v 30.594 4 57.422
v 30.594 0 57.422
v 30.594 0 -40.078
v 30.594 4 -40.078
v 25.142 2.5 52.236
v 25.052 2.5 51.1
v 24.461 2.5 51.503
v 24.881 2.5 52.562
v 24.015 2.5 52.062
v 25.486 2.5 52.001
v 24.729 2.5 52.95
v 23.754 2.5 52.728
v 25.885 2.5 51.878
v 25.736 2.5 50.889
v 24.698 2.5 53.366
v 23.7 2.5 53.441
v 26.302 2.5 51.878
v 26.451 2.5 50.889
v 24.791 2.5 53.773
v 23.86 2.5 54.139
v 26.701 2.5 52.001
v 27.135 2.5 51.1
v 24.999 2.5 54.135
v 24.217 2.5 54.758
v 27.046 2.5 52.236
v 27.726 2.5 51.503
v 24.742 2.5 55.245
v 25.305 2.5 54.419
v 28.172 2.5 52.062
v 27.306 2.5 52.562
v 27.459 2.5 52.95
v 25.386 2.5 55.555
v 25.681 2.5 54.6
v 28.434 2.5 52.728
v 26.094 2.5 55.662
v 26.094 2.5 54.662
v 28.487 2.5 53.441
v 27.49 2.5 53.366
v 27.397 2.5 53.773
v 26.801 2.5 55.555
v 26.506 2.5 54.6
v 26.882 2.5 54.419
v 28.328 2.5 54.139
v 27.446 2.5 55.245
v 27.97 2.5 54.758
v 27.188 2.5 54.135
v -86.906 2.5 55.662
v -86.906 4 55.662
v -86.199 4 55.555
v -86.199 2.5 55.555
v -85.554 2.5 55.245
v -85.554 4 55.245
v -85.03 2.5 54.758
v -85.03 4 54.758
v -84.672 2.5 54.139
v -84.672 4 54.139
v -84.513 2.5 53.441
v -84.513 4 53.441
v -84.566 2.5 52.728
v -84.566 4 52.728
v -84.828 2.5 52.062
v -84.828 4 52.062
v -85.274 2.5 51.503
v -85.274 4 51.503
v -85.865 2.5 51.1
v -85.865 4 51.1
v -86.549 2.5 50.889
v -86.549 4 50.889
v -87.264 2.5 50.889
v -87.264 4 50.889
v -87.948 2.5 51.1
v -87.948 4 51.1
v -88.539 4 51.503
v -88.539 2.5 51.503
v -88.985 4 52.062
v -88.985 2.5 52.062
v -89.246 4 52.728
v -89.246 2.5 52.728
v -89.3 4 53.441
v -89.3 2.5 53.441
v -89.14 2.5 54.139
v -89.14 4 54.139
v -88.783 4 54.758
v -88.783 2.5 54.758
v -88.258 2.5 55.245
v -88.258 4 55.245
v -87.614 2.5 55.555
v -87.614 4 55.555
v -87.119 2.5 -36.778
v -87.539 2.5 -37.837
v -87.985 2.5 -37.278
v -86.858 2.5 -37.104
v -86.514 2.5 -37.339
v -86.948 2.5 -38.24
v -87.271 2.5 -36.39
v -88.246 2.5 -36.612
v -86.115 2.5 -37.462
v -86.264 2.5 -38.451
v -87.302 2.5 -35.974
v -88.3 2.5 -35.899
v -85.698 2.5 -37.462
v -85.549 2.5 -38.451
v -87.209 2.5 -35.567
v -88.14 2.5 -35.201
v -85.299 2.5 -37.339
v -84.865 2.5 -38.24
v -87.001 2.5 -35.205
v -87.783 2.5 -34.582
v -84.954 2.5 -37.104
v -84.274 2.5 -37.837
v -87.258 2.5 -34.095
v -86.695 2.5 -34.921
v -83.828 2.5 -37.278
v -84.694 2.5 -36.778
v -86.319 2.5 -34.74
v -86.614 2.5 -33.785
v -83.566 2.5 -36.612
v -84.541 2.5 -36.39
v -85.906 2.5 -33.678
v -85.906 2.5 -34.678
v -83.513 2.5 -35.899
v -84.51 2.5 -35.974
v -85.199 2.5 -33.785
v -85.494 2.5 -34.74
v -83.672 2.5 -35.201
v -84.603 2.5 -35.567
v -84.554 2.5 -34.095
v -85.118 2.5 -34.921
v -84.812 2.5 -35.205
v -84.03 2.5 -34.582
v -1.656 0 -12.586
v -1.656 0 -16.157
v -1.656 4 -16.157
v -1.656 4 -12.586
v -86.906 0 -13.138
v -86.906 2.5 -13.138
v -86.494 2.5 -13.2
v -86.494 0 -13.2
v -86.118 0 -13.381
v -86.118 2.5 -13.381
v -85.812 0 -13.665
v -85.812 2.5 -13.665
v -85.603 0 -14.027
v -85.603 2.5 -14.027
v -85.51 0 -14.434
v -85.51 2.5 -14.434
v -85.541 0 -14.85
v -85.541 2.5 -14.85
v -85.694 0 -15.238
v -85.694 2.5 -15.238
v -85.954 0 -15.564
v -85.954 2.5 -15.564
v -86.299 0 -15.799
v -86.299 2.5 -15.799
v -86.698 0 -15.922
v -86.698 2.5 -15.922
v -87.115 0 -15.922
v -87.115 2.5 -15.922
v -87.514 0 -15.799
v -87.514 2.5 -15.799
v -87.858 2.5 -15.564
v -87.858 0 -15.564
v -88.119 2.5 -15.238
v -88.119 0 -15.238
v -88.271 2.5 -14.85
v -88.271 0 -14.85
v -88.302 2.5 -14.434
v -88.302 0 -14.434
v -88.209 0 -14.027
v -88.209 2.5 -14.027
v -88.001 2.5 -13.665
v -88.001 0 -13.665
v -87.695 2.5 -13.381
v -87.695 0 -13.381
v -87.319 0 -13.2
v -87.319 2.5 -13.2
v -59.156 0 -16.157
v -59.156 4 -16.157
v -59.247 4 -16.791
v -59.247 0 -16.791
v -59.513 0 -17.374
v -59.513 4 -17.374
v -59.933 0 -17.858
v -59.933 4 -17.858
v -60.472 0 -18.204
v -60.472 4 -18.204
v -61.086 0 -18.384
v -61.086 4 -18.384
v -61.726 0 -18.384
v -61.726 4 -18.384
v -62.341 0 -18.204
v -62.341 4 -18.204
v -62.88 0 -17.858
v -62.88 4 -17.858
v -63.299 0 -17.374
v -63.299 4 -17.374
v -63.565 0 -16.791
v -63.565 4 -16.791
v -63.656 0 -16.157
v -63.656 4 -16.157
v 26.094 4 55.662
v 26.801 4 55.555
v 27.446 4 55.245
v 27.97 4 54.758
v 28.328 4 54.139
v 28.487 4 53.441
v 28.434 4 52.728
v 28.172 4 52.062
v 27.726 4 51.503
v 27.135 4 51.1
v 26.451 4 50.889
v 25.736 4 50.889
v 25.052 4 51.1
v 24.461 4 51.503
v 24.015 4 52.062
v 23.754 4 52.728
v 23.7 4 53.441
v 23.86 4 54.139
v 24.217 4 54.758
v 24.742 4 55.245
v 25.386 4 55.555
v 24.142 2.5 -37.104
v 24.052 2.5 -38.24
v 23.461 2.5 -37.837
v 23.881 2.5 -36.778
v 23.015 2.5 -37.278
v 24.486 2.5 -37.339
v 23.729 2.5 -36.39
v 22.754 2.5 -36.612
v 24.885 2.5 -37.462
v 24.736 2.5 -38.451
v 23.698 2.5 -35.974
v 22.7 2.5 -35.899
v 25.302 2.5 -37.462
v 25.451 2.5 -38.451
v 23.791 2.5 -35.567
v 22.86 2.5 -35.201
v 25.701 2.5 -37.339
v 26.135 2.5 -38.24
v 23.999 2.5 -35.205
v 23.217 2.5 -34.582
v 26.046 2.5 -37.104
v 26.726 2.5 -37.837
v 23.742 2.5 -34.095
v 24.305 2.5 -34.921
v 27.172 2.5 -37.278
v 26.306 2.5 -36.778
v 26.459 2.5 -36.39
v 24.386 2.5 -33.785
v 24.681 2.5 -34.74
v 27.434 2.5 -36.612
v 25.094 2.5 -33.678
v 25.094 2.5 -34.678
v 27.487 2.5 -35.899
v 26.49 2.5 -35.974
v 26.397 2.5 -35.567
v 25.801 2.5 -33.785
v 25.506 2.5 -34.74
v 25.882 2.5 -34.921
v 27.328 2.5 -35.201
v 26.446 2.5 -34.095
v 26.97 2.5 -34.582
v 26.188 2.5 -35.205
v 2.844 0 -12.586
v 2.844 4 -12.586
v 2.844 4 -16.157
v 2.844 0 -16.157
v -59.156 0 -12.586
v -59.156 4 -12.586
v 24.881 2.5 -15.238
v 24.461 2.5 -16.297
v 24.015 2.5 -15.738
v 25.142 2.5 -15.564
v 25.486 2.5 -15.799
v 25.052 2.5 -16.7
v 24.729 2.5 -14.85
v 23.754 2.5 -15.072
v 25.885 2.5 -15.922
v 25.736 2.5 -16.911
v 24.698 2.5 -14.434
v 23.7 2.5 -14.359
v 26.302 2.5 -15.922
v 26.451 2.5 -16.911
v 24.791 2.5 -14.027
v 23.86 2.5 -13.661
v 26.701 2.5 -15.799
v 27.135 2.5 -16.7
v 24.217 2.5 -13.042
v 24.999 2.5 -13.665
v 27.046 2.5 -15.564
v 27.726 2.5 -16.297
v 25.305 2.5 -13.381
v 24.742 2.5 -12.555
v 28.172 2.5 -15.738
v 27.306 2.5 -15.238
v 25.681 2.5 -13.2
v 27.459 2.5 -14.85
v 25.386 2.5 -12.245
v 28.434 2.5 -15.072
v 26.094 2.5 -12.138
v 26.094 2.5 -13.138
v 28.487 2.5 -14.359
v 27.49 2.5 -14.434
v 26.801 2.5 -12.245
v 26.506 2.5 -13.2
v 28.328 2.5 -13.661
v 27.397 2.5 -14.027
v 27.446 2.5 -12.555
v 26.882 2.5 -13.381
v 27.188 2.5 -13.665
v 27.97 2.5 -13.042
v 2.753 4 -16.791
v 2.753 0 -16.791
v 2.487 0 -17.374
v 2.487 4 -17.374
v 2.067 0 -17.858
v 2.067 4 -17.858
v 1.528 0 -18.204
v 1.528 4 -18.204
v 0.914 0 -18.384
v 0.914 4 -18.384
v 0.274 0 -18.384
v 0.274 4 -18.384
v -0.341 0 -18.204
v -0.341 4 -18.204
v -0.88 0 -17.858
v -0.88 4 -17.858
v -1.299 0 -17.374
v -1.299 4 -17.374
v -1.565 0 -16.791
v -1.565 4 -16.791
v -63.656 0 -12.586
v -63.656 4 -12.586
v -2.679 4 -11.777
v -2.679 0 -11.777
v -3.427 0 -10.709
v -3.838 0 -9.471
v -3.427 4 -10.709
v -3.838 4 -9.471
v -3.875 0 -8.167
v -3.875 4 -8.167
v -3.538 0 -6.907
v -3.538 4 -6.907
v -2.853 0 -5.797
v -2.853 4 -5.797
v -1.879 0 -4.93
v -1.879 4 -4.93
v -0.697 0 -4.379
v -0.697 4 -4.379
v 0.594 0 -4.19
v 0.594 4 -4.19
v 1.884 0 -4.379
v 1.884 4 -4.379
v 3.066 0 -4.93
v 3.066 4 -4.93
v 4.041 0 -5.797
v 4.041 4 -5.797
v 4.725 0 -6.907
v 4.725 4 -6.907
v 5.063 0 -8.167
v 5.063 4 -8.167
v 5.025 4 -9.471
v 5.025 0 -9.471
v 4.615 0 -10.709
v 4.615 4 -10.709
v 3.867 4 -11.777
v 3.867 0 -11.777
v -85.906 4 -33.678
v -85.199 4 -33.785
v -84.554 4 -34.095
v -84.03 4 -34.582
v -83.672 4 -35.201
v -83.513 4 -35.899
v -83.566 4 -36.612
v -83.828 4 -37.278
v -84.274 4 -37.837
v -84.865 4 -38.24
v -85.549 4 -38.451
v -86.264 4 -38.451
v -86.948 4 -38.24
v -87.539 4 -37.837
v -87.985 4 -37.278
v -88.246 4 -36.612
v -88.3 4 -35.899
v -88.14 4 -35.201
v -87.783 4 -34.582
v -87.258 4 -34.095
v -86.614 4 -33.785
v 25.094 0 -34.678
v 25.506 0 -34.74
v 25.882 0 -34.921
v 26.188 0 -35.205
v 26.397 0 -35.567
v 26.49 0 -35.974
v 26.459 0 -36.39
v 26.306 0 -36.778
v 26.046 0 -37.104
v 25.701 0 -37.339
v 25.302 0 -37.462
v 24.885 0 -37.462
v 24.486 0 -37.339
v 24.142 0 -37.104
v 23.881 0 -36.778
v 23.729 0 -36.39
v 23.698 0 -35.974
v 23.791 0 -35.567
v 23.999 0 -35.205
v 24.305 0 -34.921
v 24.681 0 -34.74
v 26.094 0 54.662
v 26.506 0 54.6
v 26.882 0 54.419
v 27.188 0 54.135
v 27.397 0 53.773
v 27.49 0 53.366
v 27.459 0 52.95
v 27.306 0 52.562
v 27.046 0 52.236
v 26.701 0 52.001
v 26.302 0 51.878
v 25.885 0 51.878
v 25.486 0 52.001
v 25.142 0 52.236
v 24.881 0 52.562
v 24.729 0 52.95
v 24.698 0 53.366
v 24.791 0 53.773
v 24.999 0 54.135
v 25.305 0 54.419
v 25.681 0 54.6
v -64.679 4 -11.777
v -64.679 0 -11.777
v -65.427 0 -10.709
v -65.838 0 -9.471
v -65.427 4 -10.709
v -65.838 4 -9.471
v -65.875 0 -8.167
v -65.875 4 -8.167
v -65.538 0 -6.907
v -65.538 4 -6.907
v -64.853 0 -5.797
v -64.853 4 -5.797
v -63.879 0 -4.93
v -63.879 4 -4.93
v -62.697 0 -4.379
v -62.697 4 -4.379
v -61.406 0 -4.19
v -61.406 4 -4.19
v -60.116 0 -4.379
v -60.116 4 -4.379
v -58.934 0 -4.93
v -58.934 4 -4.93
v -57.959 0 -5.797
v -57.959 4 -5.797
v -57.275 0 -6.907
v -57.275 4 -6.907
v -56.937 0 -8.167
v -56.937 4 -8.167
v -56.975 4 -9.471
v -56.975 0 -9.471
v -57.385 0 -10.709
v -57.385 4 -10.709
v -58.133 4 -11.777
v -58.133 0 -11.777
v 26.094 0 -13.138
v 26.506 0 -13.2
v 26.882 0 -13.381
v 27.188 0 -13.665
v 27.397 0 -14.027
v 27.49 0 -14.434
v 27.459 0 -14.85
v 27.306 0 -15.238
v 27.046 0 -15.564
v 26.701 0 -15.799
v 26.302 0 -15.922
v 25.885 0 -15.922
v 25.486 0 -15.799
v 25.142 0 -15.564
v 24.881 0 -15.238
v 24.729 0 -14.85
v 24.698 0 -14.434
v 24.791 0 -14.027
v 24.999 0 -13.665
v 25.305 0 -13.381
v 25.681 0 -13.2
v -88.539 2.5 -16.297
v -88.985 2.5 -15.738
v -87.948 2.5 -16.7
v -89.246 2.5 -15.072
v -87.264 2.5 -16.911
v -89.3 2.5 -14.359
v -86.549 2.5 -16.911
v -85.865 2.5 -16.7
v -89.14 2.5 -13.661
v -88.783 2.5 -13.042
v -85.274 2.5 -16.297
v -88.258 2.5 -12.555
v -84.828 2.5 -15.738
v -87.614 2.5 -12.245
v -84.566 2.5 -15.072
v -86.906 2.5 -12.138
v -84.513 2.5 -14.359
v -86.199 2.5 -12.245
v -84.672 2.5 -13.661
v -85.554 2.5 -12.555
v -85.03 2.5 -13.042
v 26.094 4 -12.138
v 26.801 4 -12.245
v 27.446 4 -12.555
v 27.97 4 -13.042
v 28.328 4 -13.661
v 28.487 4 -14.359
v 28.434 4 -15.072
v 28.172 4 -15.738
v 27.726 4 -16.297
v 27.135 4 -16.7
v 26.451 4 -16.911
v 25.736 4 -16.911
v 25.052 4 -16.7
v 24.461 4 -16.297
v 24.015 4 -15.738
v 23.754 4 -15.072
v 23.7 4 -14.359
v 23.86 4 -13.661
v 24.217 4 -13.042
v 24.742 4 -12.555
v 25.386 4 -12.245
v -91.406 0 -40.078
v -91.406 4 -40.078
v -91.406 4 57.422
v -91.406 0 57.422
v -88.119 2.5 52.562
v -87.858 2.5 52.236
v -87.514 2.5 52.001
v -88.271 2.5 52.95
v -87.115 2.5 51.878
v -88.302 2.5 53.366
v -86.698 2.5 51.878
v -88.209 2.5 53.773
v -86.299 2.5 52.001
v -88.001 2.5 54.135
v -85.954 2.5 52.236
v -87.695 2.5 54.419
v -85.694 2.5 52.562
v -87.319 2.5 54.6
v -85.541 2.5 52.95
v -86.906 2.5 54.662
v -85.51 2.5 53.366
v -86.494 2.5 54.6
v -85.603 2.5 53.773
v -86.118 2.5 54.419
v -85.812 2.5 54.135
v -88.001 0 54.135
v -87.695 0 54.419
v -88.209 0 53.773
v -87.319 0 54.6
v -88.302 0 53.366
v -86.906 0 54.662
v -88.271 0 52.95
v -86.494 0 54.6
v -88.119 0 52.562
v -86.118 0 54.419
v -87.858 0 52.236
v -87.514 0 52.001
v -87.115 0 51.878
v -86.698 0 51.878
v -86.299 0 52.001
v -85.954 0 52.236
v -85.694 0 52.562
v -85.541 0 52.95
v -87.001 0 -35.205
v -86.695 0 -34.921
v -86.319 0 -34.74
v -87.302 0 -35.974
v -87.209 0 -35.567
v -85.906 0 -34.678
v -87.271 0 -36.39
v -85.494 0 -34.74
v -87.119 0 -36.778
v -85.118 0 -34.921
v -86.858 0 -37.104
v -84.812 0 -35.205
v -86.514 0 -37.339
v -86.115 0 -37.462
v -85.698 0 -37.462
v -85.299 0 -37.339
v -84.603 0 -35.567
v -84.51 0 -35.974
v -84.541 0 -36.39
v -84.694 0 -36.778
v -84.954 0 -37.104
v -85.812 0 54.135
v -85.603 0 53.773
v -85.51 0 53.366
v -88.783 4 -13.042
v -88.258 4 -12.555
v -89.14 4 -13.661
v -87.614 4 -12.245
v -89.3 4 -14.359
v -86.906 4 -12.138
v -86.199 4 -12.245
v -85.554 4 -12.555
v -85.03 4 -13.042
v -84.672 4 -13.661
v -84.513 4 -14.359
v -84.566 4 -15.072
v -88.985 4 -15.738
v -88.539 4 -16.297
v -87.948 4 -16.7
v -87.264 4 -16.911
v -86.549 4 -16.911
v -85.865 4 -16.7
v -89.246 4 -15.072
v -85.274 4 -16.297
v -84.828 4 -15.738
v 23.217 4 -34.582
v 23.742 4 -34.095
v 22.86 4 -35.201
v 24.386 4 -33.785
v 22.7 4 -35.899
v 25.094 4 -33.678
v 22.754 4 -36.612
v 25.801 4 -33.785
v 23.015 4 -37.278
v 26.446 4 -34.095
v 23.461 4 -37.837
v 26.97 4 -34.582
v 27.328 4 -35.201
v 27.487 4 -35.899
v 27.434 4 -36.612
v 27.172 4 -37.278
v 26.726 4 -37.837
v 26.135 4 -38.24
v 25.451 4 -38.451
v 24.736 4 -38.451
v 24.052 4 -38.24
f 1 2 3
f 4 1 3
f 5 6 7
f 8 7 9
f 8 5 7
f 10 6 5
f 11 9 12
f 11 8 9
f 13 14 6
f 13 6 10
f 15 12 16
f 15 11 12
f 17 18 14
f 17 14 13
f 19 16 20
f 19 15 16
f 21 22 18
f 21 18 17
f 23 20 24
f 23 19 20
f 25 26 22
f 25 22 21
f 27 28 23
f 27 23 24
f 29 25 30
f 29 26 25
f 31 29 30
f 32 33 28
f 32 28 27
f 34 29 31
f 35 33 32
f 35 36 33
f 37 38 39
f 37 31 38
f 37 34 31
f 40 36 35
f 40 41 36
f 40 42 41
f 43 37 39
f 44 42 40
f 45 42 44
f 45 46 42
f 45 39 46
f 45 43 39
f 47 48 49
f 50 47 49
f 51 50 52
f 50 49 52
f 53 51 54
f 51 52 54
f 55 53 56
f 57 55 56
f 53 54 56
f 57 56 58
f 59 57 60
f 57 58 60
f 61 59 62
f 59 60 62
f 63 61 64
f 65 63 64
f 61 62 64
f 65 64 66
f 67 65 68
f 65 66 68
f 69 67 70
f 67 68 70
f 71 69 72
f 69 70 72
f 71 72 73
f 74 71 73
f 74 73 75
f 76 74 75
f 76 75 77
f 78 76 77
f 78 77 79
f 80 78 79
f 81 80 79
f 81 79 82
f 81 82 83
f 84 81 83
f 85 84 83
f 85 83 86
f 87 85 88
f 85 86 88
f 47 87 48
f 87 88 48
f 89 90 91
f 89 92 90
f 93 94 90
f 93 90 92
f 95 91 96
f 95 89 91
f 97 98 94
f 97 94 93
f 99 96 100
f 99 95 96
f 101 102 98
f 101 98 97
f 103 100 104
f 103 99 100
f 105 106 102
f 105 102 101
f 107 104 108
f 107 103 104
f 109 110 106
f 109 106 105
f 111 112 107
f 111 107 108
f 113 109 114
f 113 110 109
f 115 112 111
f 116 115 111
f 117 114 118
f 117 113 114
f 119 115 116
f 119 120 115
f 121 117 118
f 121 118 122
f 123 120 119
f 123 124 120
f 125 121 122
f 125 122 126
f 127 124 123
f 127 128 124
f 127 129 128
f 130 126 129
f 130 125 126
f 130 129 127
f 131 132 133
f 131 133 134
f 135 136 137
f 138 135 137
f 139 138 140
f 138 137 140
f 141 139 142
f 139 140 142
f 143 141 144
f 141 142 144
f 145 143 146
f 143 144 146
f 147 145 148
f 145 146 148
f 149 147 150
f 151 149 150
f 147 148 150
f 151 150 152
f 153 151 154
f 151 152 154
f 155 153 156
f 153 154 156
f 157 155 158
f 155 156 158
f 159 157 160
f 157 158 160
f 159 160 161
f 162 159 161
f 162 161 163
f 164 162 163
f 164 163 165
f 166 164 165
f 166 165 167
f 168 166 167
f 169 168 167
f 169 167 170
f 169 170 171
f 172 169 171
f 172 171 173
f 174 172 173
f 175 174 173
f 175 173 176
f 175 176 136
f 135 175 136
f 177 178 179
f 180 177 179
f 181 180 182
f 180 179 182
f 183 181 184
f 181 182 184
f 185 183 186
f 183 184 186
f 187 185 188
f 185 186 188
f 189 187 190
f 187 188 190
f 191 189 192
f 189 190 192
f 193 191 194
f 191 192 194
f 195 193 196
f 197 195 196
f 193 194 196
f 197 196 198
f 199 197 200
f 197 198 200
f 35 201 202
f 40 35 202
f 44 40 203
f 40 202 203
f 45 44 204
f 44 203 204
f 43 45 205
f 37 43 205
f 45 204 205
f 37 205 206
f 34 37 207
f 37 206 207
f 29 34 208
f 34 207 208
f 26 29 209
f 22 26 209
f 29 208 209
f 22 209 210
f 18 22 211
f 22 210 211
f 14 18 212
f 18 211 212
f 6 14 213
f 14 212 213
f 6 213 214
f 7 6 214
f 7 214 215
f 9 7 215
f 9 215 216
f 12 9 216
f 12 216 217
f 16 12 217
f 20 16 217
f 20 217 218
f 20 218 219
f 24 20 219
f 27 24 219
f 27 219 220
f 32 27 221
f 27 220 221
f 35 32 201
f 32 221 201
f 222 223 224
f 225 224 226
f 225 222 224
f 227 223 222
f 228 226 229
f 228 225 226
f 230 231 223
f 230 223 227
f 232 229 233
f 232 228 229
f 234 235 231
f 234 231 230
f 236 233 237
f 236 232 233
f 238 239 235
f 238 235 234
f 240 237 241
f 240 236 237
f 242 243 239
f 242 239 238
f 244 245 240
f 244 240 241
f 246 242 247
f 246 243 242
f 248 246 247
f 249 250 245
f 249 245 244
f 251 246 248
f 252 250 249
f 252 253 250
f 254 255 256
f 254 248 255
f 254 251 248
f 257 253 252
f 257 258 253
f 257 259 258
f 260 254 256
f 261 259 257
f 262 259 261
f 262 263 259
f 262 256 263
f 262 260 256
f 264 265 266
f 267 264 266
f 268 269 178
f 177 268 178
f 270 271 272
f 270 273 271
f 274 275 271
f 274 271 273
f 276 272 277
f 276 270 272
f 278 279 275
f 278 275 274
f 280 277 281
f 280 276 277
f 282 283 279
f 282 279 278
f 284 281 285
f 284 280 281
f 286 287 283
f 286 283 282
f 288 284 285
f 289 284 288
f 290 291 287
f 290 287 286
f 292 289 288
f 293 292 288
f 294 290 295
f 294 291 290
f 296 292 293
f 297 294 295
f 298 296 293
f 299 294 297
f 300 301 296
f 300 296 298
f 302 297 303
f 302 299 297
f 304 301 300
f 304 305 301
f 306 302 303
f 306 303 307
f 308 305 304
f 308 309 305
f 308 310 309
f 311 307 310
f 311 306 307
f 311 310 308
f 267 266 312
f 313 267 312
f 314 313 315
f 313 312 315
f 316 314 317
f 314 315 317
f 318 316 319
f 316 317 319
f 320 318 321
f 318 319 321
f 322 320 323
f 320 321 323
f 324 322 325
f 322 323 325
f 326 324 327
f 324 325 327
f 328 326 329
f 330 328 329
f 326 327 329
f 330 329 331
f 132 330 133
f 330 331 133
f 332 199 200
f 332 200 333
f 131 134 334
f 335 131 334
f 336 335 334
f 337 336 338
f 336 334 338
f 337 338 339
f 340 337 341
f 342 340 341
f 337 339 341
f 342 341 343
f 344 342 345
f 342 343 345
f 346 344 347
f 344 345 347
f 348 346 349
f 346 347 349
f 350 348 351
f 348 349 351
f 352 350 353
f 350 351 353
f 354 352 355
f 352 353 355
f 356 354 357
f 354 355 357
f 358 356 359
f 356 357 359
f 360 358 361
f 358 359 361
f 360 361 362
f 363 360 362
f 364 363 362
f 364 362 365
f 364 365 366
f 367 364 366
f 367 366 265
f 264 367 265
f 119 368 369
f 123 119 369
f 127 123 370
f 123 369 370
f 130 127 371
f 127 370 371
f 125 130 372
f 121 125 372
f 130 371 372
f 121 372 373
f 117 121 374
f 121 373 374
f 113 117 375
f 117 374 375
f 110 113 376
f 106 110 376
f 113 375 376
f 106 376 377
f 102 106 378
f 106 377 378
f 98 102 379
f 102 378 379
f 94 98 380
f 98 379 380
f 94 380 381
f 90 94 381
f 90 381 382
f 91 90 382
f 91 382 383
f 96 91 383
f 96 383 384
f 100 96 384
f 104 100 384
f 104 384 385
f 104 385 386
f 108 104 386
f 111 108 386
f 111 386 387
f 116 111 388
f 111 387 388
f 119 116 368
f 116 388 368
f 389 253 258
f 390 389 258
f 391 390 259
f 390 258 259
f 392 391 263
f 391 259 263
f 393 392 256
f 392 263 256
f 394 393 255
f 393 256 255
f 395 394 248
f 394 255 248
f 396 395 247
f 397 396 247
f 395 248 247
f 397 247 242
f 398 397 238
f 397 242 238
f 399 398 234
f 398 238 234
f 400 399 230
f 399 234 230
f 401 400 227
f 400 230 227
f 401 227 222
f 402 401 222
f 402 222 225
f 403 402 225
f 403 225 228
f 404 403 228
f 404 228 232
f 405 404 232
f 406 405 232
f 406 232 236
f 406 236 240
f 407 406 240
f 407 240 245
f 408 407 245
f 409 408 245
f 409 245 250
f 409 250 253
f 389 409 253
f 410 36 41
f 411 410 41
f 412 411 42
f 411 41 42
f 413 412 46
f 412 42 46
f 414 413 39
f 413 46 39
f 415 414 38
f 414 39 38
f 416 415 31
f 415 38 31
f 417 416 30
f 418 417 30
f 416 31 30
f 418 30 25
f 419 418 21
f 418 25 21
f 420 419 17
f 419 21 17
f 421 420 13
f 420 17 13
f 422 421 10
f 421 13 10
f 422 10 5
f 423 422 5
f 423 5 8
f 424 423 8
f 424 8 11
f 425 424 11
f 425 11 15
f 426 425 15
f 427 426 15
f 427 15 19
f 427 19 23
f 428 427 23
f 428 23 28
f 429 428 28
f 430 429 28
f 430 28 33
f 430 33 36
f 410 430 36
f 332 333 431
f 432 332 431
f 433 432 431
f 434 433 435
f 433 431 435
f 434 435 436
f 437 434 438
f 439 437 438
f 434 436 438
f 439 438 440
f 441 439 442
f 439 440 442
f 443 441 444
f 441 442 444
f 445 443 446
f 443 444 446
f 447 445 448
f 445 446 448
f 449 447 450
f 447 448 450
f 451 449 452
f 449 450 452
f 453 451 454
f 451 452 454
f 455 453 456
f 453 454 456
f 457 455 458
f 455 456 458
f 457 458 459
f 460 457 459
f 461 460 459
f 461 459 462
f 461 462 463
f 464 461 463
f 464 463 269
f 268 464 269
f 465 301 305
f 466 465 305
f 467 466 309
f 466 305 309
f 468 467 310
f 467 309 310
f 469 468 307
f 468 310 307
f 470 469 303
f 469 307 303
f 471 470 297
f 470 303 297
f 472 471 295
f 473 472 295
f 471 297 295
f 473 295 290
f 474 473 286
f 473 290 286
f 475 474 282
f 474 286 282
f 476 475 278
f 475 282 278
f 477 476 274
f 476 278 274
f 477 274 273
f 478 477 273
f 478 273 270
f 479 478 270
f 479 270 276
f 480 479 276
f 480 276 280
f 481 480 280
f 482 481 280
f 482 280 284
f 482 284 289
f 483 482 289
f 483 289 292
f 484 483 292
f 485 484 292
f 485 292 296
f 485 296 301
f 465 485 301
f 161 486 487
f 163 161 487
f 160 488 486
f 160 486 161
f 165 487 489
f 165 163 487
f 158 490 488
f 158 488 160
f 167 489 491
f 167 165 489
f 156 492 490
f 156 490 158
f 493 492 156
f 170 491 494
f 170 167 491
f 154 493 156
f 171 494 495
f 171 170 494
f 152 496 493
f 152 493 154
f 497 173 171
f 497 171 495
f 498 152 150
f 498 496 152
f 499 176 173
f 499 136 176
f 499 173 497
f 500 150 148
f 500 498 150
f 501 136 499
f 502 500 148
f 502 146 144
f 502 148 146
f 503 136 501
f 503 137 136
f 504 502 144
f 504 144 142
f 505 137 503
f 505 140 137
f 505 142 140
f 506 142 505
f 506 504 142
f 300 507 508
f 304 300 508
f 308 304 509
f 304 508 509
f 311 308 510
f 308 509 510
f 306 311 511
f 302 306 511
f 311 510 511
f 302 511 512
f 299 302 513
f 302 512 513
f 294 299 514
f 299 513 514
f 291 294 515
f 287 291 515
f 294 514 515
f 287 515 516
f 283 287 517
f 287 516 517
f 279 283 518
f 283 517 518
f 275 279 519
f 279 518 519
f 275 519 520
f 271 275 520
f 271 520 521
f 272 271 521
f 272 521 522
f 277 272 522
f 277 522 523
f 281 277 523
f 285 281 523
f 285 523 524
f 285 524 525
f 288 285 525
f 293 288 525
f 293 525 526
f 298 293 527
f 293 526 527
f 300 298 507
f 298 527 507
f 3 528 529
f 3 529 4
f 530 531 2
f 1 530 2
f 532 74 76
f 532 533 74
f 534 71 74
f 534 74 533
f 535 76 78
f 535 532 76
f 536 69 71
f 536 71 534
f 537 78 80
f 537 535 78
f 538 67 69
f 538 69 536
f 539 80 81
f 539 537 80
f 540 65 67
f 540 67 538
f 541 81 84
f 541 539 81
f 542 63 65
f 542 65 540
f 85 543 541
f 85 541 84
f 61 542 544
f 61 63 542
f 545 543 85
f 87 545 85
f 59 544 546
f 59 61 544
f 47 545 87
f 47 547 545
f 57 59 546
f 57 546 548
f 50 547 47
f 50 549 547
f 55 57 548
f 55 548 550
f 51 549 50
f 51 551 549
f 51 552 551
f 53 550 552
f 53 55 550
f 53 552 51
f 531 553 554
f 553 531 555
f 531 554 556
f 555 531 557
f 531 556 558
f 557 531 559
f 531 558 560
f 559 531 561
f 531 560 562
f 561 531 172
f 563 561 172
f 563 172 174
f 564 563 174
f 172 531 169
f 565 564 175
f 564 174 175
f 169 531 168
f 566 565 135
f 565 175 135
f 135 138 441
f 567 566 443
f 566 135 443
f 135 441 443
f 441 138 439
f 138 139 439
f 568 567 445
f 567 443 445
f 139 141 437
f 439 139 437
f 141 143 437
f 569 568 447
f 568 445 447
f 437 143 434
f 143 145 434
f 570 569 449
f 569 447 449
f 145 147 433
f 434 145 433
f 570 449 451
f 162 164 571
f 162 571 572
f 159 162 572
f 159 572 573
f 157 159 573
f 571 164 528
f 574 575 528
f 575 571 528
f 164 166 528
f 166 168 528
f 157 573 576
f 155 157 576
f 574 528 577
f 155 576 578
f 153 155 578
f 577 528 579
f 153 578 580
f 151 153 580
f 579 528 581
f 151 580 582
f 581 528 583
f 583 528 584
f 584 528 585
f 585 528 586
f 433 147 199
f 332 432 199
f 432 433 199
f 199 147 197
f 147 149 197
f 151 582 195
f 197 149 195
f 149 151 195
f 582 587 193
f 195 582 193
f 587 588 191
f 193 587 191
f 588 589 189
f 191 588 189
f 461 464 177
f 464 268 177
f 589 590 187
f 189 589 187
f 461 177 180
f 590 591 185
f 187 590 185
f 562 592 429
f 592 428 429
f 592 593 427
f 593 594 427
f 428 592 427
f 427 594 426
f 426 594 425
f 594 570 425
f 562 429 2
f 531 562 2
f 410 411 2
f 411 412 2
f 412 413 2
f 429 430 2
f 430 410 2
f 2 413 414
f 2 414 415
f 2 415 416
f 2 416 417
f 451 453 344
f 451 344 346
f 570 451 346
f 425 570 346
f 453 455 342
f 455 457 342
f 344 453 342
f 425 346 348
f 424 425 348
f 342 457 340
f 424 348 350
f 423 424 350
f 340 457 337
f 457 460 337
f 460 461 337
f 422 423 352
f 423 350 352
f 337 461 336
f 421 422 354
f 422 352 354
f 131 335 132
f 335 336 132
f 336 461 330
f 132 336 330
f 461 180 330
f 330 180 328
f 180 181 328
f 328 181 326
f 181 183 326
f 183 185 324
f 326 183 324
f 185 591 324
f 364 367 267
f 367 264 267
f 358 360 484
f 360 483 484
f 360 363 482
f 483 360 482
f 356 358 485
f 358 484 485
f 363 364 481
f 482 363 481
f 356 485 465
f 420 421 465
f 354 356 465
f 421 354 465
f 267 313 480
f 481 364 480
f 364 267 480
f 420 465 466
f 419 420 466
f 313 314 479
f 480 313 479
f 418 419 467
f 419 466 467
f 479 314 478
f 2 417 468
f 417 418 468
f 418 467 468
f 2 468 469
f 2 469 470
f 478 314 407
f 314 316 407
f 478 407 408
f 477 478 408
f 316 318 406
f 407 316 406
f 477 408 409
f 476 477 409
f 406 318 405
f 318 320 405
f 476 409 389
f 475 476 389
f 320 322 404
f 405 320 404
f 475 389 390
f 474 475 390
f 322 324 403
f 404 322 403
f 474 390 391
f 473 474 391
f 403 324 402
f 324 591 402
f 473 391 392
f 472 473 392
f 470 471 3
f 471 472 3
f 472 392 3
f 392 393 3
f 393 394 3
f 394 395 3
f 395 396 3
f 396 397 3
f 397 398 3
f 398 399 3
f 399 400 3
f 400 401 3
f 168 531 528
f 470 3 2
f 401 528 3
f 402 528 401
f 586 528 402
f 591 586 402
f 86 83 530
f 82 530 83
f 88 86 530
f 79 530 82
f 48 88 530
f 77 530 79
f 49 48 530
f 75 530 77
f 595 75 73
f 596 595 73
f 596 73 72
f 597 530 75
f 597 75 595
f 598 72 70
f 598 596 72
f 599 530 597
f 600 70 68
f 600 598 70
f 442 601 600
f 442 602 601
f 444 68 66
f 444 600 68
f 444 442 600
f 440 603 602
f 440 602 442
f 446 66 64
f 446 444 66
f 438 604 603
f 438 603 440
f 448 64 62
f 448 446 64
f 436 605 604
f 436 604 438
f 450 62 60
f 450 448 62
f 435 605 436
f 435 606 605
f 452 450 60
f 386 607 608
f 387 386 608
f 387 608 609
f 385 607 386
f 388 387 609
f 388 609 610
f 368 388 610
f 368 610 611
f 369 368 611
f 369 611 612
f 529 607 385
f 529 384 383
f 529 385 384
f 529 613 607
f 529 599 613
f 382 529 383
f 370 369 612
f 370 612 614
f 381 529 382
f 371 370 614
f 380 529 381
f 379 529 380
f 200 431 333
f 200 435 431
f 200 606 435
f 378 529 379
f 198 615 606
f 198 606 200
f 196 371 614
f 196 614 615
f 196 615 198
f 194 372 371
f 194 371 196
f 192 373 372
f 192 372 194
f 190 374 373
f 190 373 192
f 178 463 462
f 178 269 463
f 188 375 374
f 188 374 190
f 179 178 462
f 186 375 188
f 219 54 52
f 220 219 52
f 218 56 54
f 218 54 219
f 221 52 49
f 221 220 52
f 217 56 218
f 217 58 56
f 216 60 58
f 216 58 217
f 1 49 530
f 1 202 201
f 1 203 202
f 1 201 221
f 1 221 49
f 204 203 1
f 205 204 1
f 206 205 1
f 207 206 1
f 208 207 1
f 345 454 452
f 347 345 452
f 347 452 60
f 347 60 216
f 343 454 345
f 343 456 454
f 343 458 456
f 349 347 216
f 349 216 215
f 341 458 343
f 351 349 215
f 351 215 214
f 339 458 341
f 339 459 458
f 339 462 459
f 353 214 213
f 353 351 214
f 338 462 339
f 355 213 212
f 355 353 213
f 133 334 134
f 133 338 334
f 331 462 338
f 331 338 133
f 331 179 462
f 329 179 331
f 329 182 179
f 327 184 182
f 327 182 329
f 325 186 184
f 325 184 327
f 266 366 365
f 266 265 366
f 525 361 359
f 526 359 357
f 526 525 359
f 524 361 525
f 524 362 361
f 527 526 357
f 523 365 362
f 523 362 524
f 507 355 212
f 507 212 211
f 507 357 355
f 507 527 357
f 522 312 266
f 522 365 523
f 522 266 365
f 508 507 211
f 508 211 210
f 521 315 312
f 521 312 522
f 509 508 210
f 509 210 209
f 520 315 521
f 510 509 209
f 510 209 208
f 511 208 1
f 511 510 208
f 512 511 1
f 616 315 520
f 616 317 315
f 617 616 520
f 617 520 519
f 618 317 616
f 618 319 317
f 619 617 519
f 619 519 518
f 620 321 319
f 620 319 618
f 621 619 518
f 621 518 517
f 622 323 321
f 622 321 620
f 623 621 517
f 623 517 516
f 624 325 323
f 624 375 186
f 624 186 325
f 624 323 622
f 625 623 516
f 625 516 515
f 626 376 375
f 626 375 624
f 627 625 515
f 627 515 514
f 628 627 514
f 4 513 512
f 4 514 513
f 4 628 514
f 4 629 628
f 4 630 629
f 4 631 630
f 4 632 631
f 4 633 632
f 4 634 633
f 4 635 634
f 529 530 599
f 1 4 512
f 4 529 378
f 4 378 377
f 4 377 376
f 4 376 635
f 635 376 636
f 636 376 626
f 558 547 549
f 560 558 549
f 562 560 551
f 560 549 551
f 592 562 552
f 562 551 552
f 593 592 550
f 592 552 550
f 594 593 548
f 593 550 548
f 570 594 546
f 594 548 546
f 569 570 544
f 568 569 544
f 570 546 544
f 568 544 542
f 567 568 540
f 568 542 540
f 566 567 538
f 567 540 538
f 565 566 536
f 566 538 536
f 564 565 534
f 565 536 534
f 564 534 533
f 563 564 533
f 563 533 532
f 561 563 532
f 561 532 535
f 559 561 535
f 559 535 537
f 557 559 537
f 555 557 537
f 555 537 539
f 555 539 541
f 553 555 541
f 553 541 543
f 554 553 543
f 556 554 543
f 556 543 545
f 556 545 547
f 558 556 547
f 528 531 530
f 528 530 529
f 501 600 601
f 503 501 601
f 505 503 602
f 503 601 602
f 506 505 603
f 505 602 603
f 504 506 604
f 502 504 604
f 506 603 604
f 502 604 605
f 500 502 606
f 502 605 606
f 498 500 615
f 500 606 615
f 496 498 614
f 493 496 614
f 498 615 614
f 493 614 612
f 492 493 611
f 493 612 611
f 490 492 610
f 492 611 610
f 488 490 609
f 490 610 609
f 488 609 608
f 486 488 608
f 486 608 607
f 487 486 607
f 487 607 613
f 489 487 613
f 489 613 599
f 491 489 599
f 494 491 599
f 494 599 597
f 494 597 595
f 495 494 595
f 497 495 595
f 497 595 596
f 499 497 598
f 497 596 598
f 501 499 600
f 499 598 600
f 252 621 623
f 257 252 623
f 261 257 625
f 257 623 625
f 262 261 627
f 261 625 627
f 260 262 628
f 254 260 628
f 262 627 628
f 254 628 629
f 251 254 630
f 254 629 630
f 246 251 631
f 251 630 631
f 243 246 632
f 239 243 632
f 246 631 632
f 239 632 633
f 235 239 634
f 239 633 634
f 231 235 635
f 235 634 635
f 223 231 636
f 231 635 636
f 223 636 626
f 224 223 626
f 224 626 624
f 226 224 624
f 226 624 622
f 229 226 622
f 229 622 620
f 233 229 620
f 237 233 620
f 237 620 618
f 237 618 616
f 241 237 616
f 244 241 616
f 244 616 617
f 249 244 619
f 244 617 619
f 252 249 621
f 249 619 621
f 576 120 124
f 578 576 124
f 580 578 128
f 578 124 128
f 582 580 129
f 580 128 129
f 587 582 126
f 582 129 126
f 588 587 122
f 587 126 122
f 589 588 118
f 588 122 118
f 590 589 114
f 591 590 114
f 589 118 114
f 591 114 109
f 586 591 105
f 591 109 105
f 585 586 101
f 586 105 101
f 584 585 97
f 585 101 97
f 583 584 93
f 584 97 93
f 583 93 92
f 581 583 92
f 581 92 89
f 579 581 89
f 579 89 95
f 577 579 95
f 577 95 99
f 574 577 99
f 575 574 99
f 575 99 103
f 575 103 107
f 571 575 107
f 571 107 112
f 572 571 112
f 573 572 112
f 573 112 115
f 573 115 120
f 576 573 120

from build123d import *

# Parameters (mm, degrees)
SKETCH1_W           = 122
SKETCH1_H           = 97.5
BOSS_EXTRUDE1_DEPTH = 4
SKETCH2_R           = 1.4
CUT_EXTRUDE1_DEPTH  = 4
SKETCH3_R           = 2.4
CUT_EXTRUDE2_DEPTH  = 1.5
CUT_EXTRUDE3_DEPTH  = 4


with BuildPart() as part:
    # Sketch1 → Boss-Extrude1 (new body)
    with BuildSketch(Plane(origin=(0, 0, 0), x_dir=(1, 0, 0), z_dir=(0, 1, 0))):
        with Locations((-30.40625, -8.671875)):
            Rectangle(SKETCH1_W, SKETCH1_H)
    extrude(amount=BOSS_EXTRUDE1_DEPTH)

    # Sketch2 → Cut-Extrude1 (cut)
    with BuildSketch(Plane(origin=(0, 4, 0), x_dir=(1, 0, 0), z_dir=(0, 1, 0))):
        with Locations(Location((-86.90625, -53.261875, 0), (0, 0, 270))):
            Circle(SKETCH2_R)
        with Locations(Location((-86.90625, 14.538125, 0), (0, 0, 270))):
            Circle(SKETCH2_R)
        with Locations(Location((26.09375, 14.538125, 0), (0, 0, 270))):
            Circle(SKETCH2_R)
        with Locations(Location((26.09375, -53.261875, 0), (0, 0, 270))):
            Circle(SKETCH2_R)
        with Locations(Location((-85.90625, 36.078125, 0), (0, 0, 270))):
            Circle(SKETCH2_R)
        with Locations(Location((25.09375, 36.078125, 0), (0, 0, 270))):
            Circle(SKETCH2_R)
    extrude(amount=-CUT_EXTRUDE1_DEPTH, mode=Mode.SUBTRACT)

    # Sketch3 → Cut-Extrude2 (cut)
    with BuildSketch(Plane(origin=(0, 4, 0), x_dir=(1, 0, 0), z_dir=(0, 1, 0))):
        with Locations(Location((-86.90625, 14.538125, 0), (0, 0, 270))):
            Circle(SKETCH3_R)
        with Locations(Location((-86.90625, -53.261875, 0), (0, 0, 270))):
            Circle(SKETCH3_R)
        with Locations(Location((26.09375, -53.261875, 0), (0, 0, 270))):
            Circle(SKETCH3_R)
        with Locations(Location((26.09375, 14.538125, 0), (0, 0, 270))):
            Circle(SKETCH3_R)
        with Locations(Location((-85.90625, 36.078125, 0), (0, 0, 270))):
            Circle(SKETCH3_R)
        with Locations(Location((25.09375, 36.078125, 0), (0, 0, 270))):
            Circle(SKETCH3_R)
    extrude(amount=-CUT_EXTRUDE2_DEPTH, mode=Mode.SUBTRACT)

    # Sketch4 → Cut-Extrude3 (cut)
    with BuildSketch(Plane(origin=(0, 4, 0), x_dir=(1, 0, 0), z_dir=(0, 1, 0))):
        with BuildLine():
            Line((-1.65625, 16.157315761), (-1.65625, 12.586287383))
            ThreePointArc((-1.65625, 12.586287383), (0.59375, 4.18990801), (2.84375, 12.586287383))
            Line((2.84375, 12.586287383), (2.84375, 16.157315761))
            ThreePointArc((2.84375, 16.157315761), (0.59375, 18.407315761), (-1.65625, 16.157315761))
        make_face()
        with BuildLine():
            Line((-63.65625, 16.157315761), (-63.65625, 12.586287383))
            ThreePointArc((-63.65625, 12.586287383), (-61.40625, 4.18990801), (-59.15625, 12.586287383))
            Line((-59.15625, 12.586287383), (-59.15625, 16.157315761))
            ThreePointArc((-59.15625, 16.157315761), (-61.40625, 18.407315761), (-63.65625, 16.157315761))
        make_face()
    extrude(amount=-CUT_EXTRUDE3_DEPTH, mode=Mode.SUBTRACT)


solid = part.part
